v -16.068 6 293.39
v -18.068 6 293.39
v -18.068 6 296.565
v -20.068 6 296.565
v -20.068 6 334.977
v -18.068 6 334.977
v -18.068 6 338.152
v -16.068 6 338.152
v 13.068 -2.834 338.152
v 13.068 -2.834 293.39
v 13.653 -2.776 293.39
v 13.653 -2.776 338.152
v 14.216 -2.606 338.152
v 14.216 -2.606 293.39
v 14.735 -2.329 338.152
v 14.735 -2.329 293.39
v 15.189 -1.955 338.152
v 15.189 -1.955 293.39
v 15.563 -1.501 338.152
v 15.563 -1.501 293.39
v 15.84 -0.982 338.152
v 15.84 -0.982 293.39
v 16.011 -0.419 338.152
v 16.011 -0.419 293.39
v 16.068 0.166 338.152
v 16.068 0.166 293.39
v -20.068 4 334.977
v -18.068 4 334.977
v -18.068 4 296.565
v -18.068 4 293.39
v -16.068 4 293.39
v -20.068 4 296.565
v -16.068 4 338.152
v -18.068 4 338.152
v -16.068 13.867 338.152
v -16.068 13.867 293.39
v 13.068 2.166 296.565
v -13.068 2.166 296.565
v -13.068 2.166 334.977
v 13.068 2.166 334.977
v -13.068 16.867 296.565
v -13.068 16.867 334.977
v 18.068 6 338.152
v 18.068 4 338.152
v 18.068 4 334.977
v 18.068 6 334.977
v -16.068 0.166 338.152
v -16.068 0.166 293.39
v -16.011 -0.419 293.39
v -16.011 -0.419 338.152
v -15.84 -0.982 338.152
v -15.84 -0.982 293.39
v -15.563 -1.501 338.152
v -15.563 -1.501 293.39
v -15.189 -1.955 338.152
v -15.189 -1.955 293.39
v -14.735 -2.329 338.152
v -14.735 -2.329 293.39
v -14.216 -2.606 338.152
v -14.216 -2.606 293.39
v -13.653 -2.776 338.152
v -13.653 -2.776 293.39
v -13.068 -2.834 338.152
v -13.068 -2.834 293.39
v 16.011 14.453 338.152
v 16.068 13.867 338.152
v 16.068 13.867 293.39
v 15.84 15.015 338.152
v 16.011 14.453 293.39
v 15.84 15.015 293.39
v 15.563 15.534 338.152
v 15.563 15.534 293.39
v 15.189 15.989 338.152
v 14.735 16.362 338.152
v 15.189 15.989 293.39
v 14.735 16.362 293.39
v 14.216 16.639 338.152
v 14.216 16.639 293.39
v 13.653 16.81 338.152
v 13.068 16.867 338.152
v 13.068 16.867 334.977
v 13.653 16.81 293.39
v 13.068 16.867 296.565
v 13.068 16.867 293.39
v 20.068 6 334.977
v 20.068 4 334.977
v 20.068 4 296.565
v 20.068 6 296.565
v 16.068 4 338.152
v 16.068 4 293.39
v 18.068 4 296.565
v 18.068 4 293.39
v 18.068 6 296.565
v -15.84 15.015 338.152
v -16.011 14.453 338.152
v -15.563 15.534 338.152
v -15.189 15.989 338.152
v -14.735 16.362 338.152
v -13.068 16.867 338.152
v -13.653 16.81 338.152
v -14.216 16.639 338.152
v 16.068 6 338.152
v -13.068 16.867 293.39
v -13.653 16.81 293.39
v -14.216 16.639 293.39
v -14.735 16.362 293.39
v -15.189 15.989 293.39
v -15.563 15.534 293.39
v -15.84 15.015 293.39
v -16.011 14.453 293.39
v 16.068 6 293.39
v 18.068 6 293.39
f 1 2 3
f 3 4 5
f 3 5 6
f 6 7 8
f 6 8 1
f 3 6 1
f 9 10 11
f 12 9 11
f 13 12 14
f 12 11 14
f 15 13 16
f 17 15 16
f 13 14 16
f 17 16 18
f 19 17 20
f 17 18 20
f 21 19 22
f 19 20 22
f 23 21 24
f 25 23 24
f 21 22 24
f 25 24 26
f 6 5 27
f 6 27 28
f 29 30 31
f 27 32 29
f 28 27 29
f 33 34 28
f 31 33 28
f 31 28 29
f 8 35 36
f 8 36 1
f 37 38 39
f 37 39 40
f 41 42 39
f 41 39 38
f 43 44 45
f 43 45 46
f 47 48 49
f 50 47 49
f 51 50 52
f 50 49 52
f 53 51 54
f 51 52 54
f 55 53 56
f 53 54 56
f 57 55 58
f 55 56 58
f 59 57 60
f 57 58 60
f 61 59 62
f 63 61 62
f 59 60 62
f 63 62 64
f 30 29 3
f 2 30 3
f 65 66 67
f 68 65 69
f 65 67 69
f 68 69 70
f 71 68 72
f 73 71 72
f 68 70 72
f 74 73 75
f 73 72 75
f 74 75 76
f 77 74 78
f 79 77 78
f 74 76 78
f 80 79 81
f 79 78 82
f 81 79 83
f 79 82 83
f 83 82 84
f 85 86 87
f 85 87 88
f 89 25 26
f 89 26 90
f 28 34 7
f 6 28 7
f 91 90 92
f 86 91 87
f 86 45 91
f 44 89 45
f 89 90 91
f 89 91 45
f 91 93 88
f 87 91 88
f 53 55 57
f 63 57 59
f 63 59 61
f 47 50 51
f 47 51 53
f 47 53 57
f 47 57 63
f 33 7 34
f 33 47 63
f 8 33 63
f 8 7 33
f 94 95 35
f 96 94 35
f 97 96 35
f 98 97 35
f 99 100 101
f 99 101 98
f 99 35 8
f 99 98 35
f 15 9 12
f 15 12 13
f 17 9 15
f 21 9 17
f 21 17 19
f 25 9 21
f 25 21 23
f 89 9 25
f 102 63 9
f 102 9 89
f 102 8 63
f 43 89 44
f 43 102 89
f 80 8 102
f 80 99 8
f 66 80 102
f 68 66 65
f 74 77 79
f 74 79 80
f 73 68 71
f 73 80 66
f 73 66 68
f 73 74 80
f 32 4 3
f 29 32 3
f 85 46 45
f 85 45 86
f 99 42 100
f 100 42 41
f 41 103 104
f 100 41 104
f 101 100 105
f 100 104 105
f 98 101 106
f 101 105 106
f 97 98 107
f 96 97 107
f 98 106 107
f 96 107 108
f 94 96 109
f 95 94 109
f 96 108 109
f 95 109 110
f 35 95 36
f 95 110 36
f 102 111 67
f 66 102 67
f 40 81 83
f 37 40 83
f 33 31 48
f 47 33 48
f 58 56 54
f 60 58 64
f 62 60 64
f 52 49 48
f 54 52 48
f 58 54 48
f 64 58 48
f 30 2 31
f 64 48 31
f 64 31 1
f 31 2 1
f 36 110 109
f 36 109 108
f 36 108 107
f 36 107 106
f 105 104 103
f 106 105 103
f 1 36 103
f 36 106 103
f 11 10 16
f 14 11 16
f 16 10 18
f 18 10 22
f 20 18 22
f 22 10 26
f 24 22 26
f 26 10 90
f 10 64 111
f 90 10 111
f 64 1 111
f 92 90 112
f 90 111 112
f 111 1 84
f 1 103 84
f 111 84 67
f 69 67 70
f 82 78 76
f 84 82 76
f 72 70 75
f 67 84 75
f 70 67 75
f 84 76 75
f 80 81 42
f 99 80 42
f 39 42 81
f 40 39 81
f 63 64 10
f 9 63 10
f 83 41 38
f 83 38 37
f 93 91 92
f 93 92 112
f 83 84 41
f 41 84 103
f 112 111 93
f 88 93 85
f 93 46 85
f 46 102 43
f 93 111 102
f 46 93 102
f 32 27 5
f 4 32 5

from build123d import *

# Parameters (mm, degrees)
BOSS_EXTRUDE3_DEPTH      = 1.5875
BOSS_EXTRUDE3_DEPTH_BACK = 43.175
SKETCH4_W                = 26.136325312
SKETCH4_H                = 38.4125
CUT_EXTRUDE1_DEPTH       = 14.701439982
SKETCH5_W                = 2
SKETCH5_H                = 2
BOSS_EXTRUDE5_DEPTH      = 44.7625
BOSS_EXTRUDE6_START      = -41.5875
SKETCH5_4_W              = 2
SKETCH5_4_H              = 2
BOSS_EXTRUDE6_DEPTH      = 38.4125


with BuildPart() as part:
    # Sketch3 → Boss-Extrude3 (new, two sides: drawn at the far end of the back side and taken through both)
    with BuildSketch(Plane.XY.offset(336.564940884).offset(-BOSS_EXTRUDE3_DEPTH_BACK)):
        with BuildLine():
            Line((-13.068162656, -2.834098381), (13.068162656, -2.834098381))
            ThreePointArc((13.068162656, -2.834098381), (15.189482999, -1.955418725), (16.068162656, 0.165901619))
            Line((16.068162656, 0.165901619), (16.068162656, 13.867341601))
            ThreePointArc((16.068162656, 13.867341601), (15.189482999, 15.988661944), (13.068162656, 16.867341601))
            Line((13.068162656, 16.867341601), (-13.068162656, 16.867341601))
            ThreePointArc((-13.068162656, 16.867341601), (-15.189482999, 15.988661944), (-16.068162656, 13.867341601))
            Line((-16.068162656, 13.867341601), (-16.068162656, 0.165901619))
            ThreePointArc((-16.068162656, 0.165901619), (-15.189482999, -1.955418725), (-13.068162656, -2.834098381))
        make_face()
    extrude(amount=BOSS_EXTRUDE3_DEPTH + BOSS_EXTRUDE3_DEPTH_BACK)

    # Sketch4 → Cut-Extrude1 (cut)
    with BuildSketch(Plane(origin=(0, 16.867341601, 0), x_dir=(1, 0, 0), z_dir=(0, 1, 0))):
        with Locations((0, -315.771190884)):
            Rectangle(SKETCH4_W, SKETCH4_H)
    extrude(amount=-CUT_EXTRUDE1_DEPTH, mode=Mode.SUBTRACT)

    # Sketch5 → Boss-Extrude5 (add)
    with BuildSketch(Plane.XY.offset(338.152440884)):
        with Locations((-17.068162656, 5)):
            Rectangle(SKETCH5_W, SKETCH5_H)
        with Locations((17.068162656, 5)):
            Rectangle(SKETCH5_W, SKETCH5_H)
    extrude(amount=-BOSS_EXTRUDE5_DEPTH)

    # Sketch5<4> → Boss-Extrude6 (add)
    with BuildSketch(Plane.XY.offset(338.152440884).offset(BOSS_EXTRUDE6_START)):
        with Locations((19.068162656, 5)):
            Rectangle(SKETCH5_4_W, SKETCH5_4_H)
        with Locations((-19.068162656, 5)):
            Rectangle(SKETCH5_4_W, SKETCH5_4_H)
    extrude(amount=BOSS_EXTRUDE6_DEPTH)


solid = part.part
